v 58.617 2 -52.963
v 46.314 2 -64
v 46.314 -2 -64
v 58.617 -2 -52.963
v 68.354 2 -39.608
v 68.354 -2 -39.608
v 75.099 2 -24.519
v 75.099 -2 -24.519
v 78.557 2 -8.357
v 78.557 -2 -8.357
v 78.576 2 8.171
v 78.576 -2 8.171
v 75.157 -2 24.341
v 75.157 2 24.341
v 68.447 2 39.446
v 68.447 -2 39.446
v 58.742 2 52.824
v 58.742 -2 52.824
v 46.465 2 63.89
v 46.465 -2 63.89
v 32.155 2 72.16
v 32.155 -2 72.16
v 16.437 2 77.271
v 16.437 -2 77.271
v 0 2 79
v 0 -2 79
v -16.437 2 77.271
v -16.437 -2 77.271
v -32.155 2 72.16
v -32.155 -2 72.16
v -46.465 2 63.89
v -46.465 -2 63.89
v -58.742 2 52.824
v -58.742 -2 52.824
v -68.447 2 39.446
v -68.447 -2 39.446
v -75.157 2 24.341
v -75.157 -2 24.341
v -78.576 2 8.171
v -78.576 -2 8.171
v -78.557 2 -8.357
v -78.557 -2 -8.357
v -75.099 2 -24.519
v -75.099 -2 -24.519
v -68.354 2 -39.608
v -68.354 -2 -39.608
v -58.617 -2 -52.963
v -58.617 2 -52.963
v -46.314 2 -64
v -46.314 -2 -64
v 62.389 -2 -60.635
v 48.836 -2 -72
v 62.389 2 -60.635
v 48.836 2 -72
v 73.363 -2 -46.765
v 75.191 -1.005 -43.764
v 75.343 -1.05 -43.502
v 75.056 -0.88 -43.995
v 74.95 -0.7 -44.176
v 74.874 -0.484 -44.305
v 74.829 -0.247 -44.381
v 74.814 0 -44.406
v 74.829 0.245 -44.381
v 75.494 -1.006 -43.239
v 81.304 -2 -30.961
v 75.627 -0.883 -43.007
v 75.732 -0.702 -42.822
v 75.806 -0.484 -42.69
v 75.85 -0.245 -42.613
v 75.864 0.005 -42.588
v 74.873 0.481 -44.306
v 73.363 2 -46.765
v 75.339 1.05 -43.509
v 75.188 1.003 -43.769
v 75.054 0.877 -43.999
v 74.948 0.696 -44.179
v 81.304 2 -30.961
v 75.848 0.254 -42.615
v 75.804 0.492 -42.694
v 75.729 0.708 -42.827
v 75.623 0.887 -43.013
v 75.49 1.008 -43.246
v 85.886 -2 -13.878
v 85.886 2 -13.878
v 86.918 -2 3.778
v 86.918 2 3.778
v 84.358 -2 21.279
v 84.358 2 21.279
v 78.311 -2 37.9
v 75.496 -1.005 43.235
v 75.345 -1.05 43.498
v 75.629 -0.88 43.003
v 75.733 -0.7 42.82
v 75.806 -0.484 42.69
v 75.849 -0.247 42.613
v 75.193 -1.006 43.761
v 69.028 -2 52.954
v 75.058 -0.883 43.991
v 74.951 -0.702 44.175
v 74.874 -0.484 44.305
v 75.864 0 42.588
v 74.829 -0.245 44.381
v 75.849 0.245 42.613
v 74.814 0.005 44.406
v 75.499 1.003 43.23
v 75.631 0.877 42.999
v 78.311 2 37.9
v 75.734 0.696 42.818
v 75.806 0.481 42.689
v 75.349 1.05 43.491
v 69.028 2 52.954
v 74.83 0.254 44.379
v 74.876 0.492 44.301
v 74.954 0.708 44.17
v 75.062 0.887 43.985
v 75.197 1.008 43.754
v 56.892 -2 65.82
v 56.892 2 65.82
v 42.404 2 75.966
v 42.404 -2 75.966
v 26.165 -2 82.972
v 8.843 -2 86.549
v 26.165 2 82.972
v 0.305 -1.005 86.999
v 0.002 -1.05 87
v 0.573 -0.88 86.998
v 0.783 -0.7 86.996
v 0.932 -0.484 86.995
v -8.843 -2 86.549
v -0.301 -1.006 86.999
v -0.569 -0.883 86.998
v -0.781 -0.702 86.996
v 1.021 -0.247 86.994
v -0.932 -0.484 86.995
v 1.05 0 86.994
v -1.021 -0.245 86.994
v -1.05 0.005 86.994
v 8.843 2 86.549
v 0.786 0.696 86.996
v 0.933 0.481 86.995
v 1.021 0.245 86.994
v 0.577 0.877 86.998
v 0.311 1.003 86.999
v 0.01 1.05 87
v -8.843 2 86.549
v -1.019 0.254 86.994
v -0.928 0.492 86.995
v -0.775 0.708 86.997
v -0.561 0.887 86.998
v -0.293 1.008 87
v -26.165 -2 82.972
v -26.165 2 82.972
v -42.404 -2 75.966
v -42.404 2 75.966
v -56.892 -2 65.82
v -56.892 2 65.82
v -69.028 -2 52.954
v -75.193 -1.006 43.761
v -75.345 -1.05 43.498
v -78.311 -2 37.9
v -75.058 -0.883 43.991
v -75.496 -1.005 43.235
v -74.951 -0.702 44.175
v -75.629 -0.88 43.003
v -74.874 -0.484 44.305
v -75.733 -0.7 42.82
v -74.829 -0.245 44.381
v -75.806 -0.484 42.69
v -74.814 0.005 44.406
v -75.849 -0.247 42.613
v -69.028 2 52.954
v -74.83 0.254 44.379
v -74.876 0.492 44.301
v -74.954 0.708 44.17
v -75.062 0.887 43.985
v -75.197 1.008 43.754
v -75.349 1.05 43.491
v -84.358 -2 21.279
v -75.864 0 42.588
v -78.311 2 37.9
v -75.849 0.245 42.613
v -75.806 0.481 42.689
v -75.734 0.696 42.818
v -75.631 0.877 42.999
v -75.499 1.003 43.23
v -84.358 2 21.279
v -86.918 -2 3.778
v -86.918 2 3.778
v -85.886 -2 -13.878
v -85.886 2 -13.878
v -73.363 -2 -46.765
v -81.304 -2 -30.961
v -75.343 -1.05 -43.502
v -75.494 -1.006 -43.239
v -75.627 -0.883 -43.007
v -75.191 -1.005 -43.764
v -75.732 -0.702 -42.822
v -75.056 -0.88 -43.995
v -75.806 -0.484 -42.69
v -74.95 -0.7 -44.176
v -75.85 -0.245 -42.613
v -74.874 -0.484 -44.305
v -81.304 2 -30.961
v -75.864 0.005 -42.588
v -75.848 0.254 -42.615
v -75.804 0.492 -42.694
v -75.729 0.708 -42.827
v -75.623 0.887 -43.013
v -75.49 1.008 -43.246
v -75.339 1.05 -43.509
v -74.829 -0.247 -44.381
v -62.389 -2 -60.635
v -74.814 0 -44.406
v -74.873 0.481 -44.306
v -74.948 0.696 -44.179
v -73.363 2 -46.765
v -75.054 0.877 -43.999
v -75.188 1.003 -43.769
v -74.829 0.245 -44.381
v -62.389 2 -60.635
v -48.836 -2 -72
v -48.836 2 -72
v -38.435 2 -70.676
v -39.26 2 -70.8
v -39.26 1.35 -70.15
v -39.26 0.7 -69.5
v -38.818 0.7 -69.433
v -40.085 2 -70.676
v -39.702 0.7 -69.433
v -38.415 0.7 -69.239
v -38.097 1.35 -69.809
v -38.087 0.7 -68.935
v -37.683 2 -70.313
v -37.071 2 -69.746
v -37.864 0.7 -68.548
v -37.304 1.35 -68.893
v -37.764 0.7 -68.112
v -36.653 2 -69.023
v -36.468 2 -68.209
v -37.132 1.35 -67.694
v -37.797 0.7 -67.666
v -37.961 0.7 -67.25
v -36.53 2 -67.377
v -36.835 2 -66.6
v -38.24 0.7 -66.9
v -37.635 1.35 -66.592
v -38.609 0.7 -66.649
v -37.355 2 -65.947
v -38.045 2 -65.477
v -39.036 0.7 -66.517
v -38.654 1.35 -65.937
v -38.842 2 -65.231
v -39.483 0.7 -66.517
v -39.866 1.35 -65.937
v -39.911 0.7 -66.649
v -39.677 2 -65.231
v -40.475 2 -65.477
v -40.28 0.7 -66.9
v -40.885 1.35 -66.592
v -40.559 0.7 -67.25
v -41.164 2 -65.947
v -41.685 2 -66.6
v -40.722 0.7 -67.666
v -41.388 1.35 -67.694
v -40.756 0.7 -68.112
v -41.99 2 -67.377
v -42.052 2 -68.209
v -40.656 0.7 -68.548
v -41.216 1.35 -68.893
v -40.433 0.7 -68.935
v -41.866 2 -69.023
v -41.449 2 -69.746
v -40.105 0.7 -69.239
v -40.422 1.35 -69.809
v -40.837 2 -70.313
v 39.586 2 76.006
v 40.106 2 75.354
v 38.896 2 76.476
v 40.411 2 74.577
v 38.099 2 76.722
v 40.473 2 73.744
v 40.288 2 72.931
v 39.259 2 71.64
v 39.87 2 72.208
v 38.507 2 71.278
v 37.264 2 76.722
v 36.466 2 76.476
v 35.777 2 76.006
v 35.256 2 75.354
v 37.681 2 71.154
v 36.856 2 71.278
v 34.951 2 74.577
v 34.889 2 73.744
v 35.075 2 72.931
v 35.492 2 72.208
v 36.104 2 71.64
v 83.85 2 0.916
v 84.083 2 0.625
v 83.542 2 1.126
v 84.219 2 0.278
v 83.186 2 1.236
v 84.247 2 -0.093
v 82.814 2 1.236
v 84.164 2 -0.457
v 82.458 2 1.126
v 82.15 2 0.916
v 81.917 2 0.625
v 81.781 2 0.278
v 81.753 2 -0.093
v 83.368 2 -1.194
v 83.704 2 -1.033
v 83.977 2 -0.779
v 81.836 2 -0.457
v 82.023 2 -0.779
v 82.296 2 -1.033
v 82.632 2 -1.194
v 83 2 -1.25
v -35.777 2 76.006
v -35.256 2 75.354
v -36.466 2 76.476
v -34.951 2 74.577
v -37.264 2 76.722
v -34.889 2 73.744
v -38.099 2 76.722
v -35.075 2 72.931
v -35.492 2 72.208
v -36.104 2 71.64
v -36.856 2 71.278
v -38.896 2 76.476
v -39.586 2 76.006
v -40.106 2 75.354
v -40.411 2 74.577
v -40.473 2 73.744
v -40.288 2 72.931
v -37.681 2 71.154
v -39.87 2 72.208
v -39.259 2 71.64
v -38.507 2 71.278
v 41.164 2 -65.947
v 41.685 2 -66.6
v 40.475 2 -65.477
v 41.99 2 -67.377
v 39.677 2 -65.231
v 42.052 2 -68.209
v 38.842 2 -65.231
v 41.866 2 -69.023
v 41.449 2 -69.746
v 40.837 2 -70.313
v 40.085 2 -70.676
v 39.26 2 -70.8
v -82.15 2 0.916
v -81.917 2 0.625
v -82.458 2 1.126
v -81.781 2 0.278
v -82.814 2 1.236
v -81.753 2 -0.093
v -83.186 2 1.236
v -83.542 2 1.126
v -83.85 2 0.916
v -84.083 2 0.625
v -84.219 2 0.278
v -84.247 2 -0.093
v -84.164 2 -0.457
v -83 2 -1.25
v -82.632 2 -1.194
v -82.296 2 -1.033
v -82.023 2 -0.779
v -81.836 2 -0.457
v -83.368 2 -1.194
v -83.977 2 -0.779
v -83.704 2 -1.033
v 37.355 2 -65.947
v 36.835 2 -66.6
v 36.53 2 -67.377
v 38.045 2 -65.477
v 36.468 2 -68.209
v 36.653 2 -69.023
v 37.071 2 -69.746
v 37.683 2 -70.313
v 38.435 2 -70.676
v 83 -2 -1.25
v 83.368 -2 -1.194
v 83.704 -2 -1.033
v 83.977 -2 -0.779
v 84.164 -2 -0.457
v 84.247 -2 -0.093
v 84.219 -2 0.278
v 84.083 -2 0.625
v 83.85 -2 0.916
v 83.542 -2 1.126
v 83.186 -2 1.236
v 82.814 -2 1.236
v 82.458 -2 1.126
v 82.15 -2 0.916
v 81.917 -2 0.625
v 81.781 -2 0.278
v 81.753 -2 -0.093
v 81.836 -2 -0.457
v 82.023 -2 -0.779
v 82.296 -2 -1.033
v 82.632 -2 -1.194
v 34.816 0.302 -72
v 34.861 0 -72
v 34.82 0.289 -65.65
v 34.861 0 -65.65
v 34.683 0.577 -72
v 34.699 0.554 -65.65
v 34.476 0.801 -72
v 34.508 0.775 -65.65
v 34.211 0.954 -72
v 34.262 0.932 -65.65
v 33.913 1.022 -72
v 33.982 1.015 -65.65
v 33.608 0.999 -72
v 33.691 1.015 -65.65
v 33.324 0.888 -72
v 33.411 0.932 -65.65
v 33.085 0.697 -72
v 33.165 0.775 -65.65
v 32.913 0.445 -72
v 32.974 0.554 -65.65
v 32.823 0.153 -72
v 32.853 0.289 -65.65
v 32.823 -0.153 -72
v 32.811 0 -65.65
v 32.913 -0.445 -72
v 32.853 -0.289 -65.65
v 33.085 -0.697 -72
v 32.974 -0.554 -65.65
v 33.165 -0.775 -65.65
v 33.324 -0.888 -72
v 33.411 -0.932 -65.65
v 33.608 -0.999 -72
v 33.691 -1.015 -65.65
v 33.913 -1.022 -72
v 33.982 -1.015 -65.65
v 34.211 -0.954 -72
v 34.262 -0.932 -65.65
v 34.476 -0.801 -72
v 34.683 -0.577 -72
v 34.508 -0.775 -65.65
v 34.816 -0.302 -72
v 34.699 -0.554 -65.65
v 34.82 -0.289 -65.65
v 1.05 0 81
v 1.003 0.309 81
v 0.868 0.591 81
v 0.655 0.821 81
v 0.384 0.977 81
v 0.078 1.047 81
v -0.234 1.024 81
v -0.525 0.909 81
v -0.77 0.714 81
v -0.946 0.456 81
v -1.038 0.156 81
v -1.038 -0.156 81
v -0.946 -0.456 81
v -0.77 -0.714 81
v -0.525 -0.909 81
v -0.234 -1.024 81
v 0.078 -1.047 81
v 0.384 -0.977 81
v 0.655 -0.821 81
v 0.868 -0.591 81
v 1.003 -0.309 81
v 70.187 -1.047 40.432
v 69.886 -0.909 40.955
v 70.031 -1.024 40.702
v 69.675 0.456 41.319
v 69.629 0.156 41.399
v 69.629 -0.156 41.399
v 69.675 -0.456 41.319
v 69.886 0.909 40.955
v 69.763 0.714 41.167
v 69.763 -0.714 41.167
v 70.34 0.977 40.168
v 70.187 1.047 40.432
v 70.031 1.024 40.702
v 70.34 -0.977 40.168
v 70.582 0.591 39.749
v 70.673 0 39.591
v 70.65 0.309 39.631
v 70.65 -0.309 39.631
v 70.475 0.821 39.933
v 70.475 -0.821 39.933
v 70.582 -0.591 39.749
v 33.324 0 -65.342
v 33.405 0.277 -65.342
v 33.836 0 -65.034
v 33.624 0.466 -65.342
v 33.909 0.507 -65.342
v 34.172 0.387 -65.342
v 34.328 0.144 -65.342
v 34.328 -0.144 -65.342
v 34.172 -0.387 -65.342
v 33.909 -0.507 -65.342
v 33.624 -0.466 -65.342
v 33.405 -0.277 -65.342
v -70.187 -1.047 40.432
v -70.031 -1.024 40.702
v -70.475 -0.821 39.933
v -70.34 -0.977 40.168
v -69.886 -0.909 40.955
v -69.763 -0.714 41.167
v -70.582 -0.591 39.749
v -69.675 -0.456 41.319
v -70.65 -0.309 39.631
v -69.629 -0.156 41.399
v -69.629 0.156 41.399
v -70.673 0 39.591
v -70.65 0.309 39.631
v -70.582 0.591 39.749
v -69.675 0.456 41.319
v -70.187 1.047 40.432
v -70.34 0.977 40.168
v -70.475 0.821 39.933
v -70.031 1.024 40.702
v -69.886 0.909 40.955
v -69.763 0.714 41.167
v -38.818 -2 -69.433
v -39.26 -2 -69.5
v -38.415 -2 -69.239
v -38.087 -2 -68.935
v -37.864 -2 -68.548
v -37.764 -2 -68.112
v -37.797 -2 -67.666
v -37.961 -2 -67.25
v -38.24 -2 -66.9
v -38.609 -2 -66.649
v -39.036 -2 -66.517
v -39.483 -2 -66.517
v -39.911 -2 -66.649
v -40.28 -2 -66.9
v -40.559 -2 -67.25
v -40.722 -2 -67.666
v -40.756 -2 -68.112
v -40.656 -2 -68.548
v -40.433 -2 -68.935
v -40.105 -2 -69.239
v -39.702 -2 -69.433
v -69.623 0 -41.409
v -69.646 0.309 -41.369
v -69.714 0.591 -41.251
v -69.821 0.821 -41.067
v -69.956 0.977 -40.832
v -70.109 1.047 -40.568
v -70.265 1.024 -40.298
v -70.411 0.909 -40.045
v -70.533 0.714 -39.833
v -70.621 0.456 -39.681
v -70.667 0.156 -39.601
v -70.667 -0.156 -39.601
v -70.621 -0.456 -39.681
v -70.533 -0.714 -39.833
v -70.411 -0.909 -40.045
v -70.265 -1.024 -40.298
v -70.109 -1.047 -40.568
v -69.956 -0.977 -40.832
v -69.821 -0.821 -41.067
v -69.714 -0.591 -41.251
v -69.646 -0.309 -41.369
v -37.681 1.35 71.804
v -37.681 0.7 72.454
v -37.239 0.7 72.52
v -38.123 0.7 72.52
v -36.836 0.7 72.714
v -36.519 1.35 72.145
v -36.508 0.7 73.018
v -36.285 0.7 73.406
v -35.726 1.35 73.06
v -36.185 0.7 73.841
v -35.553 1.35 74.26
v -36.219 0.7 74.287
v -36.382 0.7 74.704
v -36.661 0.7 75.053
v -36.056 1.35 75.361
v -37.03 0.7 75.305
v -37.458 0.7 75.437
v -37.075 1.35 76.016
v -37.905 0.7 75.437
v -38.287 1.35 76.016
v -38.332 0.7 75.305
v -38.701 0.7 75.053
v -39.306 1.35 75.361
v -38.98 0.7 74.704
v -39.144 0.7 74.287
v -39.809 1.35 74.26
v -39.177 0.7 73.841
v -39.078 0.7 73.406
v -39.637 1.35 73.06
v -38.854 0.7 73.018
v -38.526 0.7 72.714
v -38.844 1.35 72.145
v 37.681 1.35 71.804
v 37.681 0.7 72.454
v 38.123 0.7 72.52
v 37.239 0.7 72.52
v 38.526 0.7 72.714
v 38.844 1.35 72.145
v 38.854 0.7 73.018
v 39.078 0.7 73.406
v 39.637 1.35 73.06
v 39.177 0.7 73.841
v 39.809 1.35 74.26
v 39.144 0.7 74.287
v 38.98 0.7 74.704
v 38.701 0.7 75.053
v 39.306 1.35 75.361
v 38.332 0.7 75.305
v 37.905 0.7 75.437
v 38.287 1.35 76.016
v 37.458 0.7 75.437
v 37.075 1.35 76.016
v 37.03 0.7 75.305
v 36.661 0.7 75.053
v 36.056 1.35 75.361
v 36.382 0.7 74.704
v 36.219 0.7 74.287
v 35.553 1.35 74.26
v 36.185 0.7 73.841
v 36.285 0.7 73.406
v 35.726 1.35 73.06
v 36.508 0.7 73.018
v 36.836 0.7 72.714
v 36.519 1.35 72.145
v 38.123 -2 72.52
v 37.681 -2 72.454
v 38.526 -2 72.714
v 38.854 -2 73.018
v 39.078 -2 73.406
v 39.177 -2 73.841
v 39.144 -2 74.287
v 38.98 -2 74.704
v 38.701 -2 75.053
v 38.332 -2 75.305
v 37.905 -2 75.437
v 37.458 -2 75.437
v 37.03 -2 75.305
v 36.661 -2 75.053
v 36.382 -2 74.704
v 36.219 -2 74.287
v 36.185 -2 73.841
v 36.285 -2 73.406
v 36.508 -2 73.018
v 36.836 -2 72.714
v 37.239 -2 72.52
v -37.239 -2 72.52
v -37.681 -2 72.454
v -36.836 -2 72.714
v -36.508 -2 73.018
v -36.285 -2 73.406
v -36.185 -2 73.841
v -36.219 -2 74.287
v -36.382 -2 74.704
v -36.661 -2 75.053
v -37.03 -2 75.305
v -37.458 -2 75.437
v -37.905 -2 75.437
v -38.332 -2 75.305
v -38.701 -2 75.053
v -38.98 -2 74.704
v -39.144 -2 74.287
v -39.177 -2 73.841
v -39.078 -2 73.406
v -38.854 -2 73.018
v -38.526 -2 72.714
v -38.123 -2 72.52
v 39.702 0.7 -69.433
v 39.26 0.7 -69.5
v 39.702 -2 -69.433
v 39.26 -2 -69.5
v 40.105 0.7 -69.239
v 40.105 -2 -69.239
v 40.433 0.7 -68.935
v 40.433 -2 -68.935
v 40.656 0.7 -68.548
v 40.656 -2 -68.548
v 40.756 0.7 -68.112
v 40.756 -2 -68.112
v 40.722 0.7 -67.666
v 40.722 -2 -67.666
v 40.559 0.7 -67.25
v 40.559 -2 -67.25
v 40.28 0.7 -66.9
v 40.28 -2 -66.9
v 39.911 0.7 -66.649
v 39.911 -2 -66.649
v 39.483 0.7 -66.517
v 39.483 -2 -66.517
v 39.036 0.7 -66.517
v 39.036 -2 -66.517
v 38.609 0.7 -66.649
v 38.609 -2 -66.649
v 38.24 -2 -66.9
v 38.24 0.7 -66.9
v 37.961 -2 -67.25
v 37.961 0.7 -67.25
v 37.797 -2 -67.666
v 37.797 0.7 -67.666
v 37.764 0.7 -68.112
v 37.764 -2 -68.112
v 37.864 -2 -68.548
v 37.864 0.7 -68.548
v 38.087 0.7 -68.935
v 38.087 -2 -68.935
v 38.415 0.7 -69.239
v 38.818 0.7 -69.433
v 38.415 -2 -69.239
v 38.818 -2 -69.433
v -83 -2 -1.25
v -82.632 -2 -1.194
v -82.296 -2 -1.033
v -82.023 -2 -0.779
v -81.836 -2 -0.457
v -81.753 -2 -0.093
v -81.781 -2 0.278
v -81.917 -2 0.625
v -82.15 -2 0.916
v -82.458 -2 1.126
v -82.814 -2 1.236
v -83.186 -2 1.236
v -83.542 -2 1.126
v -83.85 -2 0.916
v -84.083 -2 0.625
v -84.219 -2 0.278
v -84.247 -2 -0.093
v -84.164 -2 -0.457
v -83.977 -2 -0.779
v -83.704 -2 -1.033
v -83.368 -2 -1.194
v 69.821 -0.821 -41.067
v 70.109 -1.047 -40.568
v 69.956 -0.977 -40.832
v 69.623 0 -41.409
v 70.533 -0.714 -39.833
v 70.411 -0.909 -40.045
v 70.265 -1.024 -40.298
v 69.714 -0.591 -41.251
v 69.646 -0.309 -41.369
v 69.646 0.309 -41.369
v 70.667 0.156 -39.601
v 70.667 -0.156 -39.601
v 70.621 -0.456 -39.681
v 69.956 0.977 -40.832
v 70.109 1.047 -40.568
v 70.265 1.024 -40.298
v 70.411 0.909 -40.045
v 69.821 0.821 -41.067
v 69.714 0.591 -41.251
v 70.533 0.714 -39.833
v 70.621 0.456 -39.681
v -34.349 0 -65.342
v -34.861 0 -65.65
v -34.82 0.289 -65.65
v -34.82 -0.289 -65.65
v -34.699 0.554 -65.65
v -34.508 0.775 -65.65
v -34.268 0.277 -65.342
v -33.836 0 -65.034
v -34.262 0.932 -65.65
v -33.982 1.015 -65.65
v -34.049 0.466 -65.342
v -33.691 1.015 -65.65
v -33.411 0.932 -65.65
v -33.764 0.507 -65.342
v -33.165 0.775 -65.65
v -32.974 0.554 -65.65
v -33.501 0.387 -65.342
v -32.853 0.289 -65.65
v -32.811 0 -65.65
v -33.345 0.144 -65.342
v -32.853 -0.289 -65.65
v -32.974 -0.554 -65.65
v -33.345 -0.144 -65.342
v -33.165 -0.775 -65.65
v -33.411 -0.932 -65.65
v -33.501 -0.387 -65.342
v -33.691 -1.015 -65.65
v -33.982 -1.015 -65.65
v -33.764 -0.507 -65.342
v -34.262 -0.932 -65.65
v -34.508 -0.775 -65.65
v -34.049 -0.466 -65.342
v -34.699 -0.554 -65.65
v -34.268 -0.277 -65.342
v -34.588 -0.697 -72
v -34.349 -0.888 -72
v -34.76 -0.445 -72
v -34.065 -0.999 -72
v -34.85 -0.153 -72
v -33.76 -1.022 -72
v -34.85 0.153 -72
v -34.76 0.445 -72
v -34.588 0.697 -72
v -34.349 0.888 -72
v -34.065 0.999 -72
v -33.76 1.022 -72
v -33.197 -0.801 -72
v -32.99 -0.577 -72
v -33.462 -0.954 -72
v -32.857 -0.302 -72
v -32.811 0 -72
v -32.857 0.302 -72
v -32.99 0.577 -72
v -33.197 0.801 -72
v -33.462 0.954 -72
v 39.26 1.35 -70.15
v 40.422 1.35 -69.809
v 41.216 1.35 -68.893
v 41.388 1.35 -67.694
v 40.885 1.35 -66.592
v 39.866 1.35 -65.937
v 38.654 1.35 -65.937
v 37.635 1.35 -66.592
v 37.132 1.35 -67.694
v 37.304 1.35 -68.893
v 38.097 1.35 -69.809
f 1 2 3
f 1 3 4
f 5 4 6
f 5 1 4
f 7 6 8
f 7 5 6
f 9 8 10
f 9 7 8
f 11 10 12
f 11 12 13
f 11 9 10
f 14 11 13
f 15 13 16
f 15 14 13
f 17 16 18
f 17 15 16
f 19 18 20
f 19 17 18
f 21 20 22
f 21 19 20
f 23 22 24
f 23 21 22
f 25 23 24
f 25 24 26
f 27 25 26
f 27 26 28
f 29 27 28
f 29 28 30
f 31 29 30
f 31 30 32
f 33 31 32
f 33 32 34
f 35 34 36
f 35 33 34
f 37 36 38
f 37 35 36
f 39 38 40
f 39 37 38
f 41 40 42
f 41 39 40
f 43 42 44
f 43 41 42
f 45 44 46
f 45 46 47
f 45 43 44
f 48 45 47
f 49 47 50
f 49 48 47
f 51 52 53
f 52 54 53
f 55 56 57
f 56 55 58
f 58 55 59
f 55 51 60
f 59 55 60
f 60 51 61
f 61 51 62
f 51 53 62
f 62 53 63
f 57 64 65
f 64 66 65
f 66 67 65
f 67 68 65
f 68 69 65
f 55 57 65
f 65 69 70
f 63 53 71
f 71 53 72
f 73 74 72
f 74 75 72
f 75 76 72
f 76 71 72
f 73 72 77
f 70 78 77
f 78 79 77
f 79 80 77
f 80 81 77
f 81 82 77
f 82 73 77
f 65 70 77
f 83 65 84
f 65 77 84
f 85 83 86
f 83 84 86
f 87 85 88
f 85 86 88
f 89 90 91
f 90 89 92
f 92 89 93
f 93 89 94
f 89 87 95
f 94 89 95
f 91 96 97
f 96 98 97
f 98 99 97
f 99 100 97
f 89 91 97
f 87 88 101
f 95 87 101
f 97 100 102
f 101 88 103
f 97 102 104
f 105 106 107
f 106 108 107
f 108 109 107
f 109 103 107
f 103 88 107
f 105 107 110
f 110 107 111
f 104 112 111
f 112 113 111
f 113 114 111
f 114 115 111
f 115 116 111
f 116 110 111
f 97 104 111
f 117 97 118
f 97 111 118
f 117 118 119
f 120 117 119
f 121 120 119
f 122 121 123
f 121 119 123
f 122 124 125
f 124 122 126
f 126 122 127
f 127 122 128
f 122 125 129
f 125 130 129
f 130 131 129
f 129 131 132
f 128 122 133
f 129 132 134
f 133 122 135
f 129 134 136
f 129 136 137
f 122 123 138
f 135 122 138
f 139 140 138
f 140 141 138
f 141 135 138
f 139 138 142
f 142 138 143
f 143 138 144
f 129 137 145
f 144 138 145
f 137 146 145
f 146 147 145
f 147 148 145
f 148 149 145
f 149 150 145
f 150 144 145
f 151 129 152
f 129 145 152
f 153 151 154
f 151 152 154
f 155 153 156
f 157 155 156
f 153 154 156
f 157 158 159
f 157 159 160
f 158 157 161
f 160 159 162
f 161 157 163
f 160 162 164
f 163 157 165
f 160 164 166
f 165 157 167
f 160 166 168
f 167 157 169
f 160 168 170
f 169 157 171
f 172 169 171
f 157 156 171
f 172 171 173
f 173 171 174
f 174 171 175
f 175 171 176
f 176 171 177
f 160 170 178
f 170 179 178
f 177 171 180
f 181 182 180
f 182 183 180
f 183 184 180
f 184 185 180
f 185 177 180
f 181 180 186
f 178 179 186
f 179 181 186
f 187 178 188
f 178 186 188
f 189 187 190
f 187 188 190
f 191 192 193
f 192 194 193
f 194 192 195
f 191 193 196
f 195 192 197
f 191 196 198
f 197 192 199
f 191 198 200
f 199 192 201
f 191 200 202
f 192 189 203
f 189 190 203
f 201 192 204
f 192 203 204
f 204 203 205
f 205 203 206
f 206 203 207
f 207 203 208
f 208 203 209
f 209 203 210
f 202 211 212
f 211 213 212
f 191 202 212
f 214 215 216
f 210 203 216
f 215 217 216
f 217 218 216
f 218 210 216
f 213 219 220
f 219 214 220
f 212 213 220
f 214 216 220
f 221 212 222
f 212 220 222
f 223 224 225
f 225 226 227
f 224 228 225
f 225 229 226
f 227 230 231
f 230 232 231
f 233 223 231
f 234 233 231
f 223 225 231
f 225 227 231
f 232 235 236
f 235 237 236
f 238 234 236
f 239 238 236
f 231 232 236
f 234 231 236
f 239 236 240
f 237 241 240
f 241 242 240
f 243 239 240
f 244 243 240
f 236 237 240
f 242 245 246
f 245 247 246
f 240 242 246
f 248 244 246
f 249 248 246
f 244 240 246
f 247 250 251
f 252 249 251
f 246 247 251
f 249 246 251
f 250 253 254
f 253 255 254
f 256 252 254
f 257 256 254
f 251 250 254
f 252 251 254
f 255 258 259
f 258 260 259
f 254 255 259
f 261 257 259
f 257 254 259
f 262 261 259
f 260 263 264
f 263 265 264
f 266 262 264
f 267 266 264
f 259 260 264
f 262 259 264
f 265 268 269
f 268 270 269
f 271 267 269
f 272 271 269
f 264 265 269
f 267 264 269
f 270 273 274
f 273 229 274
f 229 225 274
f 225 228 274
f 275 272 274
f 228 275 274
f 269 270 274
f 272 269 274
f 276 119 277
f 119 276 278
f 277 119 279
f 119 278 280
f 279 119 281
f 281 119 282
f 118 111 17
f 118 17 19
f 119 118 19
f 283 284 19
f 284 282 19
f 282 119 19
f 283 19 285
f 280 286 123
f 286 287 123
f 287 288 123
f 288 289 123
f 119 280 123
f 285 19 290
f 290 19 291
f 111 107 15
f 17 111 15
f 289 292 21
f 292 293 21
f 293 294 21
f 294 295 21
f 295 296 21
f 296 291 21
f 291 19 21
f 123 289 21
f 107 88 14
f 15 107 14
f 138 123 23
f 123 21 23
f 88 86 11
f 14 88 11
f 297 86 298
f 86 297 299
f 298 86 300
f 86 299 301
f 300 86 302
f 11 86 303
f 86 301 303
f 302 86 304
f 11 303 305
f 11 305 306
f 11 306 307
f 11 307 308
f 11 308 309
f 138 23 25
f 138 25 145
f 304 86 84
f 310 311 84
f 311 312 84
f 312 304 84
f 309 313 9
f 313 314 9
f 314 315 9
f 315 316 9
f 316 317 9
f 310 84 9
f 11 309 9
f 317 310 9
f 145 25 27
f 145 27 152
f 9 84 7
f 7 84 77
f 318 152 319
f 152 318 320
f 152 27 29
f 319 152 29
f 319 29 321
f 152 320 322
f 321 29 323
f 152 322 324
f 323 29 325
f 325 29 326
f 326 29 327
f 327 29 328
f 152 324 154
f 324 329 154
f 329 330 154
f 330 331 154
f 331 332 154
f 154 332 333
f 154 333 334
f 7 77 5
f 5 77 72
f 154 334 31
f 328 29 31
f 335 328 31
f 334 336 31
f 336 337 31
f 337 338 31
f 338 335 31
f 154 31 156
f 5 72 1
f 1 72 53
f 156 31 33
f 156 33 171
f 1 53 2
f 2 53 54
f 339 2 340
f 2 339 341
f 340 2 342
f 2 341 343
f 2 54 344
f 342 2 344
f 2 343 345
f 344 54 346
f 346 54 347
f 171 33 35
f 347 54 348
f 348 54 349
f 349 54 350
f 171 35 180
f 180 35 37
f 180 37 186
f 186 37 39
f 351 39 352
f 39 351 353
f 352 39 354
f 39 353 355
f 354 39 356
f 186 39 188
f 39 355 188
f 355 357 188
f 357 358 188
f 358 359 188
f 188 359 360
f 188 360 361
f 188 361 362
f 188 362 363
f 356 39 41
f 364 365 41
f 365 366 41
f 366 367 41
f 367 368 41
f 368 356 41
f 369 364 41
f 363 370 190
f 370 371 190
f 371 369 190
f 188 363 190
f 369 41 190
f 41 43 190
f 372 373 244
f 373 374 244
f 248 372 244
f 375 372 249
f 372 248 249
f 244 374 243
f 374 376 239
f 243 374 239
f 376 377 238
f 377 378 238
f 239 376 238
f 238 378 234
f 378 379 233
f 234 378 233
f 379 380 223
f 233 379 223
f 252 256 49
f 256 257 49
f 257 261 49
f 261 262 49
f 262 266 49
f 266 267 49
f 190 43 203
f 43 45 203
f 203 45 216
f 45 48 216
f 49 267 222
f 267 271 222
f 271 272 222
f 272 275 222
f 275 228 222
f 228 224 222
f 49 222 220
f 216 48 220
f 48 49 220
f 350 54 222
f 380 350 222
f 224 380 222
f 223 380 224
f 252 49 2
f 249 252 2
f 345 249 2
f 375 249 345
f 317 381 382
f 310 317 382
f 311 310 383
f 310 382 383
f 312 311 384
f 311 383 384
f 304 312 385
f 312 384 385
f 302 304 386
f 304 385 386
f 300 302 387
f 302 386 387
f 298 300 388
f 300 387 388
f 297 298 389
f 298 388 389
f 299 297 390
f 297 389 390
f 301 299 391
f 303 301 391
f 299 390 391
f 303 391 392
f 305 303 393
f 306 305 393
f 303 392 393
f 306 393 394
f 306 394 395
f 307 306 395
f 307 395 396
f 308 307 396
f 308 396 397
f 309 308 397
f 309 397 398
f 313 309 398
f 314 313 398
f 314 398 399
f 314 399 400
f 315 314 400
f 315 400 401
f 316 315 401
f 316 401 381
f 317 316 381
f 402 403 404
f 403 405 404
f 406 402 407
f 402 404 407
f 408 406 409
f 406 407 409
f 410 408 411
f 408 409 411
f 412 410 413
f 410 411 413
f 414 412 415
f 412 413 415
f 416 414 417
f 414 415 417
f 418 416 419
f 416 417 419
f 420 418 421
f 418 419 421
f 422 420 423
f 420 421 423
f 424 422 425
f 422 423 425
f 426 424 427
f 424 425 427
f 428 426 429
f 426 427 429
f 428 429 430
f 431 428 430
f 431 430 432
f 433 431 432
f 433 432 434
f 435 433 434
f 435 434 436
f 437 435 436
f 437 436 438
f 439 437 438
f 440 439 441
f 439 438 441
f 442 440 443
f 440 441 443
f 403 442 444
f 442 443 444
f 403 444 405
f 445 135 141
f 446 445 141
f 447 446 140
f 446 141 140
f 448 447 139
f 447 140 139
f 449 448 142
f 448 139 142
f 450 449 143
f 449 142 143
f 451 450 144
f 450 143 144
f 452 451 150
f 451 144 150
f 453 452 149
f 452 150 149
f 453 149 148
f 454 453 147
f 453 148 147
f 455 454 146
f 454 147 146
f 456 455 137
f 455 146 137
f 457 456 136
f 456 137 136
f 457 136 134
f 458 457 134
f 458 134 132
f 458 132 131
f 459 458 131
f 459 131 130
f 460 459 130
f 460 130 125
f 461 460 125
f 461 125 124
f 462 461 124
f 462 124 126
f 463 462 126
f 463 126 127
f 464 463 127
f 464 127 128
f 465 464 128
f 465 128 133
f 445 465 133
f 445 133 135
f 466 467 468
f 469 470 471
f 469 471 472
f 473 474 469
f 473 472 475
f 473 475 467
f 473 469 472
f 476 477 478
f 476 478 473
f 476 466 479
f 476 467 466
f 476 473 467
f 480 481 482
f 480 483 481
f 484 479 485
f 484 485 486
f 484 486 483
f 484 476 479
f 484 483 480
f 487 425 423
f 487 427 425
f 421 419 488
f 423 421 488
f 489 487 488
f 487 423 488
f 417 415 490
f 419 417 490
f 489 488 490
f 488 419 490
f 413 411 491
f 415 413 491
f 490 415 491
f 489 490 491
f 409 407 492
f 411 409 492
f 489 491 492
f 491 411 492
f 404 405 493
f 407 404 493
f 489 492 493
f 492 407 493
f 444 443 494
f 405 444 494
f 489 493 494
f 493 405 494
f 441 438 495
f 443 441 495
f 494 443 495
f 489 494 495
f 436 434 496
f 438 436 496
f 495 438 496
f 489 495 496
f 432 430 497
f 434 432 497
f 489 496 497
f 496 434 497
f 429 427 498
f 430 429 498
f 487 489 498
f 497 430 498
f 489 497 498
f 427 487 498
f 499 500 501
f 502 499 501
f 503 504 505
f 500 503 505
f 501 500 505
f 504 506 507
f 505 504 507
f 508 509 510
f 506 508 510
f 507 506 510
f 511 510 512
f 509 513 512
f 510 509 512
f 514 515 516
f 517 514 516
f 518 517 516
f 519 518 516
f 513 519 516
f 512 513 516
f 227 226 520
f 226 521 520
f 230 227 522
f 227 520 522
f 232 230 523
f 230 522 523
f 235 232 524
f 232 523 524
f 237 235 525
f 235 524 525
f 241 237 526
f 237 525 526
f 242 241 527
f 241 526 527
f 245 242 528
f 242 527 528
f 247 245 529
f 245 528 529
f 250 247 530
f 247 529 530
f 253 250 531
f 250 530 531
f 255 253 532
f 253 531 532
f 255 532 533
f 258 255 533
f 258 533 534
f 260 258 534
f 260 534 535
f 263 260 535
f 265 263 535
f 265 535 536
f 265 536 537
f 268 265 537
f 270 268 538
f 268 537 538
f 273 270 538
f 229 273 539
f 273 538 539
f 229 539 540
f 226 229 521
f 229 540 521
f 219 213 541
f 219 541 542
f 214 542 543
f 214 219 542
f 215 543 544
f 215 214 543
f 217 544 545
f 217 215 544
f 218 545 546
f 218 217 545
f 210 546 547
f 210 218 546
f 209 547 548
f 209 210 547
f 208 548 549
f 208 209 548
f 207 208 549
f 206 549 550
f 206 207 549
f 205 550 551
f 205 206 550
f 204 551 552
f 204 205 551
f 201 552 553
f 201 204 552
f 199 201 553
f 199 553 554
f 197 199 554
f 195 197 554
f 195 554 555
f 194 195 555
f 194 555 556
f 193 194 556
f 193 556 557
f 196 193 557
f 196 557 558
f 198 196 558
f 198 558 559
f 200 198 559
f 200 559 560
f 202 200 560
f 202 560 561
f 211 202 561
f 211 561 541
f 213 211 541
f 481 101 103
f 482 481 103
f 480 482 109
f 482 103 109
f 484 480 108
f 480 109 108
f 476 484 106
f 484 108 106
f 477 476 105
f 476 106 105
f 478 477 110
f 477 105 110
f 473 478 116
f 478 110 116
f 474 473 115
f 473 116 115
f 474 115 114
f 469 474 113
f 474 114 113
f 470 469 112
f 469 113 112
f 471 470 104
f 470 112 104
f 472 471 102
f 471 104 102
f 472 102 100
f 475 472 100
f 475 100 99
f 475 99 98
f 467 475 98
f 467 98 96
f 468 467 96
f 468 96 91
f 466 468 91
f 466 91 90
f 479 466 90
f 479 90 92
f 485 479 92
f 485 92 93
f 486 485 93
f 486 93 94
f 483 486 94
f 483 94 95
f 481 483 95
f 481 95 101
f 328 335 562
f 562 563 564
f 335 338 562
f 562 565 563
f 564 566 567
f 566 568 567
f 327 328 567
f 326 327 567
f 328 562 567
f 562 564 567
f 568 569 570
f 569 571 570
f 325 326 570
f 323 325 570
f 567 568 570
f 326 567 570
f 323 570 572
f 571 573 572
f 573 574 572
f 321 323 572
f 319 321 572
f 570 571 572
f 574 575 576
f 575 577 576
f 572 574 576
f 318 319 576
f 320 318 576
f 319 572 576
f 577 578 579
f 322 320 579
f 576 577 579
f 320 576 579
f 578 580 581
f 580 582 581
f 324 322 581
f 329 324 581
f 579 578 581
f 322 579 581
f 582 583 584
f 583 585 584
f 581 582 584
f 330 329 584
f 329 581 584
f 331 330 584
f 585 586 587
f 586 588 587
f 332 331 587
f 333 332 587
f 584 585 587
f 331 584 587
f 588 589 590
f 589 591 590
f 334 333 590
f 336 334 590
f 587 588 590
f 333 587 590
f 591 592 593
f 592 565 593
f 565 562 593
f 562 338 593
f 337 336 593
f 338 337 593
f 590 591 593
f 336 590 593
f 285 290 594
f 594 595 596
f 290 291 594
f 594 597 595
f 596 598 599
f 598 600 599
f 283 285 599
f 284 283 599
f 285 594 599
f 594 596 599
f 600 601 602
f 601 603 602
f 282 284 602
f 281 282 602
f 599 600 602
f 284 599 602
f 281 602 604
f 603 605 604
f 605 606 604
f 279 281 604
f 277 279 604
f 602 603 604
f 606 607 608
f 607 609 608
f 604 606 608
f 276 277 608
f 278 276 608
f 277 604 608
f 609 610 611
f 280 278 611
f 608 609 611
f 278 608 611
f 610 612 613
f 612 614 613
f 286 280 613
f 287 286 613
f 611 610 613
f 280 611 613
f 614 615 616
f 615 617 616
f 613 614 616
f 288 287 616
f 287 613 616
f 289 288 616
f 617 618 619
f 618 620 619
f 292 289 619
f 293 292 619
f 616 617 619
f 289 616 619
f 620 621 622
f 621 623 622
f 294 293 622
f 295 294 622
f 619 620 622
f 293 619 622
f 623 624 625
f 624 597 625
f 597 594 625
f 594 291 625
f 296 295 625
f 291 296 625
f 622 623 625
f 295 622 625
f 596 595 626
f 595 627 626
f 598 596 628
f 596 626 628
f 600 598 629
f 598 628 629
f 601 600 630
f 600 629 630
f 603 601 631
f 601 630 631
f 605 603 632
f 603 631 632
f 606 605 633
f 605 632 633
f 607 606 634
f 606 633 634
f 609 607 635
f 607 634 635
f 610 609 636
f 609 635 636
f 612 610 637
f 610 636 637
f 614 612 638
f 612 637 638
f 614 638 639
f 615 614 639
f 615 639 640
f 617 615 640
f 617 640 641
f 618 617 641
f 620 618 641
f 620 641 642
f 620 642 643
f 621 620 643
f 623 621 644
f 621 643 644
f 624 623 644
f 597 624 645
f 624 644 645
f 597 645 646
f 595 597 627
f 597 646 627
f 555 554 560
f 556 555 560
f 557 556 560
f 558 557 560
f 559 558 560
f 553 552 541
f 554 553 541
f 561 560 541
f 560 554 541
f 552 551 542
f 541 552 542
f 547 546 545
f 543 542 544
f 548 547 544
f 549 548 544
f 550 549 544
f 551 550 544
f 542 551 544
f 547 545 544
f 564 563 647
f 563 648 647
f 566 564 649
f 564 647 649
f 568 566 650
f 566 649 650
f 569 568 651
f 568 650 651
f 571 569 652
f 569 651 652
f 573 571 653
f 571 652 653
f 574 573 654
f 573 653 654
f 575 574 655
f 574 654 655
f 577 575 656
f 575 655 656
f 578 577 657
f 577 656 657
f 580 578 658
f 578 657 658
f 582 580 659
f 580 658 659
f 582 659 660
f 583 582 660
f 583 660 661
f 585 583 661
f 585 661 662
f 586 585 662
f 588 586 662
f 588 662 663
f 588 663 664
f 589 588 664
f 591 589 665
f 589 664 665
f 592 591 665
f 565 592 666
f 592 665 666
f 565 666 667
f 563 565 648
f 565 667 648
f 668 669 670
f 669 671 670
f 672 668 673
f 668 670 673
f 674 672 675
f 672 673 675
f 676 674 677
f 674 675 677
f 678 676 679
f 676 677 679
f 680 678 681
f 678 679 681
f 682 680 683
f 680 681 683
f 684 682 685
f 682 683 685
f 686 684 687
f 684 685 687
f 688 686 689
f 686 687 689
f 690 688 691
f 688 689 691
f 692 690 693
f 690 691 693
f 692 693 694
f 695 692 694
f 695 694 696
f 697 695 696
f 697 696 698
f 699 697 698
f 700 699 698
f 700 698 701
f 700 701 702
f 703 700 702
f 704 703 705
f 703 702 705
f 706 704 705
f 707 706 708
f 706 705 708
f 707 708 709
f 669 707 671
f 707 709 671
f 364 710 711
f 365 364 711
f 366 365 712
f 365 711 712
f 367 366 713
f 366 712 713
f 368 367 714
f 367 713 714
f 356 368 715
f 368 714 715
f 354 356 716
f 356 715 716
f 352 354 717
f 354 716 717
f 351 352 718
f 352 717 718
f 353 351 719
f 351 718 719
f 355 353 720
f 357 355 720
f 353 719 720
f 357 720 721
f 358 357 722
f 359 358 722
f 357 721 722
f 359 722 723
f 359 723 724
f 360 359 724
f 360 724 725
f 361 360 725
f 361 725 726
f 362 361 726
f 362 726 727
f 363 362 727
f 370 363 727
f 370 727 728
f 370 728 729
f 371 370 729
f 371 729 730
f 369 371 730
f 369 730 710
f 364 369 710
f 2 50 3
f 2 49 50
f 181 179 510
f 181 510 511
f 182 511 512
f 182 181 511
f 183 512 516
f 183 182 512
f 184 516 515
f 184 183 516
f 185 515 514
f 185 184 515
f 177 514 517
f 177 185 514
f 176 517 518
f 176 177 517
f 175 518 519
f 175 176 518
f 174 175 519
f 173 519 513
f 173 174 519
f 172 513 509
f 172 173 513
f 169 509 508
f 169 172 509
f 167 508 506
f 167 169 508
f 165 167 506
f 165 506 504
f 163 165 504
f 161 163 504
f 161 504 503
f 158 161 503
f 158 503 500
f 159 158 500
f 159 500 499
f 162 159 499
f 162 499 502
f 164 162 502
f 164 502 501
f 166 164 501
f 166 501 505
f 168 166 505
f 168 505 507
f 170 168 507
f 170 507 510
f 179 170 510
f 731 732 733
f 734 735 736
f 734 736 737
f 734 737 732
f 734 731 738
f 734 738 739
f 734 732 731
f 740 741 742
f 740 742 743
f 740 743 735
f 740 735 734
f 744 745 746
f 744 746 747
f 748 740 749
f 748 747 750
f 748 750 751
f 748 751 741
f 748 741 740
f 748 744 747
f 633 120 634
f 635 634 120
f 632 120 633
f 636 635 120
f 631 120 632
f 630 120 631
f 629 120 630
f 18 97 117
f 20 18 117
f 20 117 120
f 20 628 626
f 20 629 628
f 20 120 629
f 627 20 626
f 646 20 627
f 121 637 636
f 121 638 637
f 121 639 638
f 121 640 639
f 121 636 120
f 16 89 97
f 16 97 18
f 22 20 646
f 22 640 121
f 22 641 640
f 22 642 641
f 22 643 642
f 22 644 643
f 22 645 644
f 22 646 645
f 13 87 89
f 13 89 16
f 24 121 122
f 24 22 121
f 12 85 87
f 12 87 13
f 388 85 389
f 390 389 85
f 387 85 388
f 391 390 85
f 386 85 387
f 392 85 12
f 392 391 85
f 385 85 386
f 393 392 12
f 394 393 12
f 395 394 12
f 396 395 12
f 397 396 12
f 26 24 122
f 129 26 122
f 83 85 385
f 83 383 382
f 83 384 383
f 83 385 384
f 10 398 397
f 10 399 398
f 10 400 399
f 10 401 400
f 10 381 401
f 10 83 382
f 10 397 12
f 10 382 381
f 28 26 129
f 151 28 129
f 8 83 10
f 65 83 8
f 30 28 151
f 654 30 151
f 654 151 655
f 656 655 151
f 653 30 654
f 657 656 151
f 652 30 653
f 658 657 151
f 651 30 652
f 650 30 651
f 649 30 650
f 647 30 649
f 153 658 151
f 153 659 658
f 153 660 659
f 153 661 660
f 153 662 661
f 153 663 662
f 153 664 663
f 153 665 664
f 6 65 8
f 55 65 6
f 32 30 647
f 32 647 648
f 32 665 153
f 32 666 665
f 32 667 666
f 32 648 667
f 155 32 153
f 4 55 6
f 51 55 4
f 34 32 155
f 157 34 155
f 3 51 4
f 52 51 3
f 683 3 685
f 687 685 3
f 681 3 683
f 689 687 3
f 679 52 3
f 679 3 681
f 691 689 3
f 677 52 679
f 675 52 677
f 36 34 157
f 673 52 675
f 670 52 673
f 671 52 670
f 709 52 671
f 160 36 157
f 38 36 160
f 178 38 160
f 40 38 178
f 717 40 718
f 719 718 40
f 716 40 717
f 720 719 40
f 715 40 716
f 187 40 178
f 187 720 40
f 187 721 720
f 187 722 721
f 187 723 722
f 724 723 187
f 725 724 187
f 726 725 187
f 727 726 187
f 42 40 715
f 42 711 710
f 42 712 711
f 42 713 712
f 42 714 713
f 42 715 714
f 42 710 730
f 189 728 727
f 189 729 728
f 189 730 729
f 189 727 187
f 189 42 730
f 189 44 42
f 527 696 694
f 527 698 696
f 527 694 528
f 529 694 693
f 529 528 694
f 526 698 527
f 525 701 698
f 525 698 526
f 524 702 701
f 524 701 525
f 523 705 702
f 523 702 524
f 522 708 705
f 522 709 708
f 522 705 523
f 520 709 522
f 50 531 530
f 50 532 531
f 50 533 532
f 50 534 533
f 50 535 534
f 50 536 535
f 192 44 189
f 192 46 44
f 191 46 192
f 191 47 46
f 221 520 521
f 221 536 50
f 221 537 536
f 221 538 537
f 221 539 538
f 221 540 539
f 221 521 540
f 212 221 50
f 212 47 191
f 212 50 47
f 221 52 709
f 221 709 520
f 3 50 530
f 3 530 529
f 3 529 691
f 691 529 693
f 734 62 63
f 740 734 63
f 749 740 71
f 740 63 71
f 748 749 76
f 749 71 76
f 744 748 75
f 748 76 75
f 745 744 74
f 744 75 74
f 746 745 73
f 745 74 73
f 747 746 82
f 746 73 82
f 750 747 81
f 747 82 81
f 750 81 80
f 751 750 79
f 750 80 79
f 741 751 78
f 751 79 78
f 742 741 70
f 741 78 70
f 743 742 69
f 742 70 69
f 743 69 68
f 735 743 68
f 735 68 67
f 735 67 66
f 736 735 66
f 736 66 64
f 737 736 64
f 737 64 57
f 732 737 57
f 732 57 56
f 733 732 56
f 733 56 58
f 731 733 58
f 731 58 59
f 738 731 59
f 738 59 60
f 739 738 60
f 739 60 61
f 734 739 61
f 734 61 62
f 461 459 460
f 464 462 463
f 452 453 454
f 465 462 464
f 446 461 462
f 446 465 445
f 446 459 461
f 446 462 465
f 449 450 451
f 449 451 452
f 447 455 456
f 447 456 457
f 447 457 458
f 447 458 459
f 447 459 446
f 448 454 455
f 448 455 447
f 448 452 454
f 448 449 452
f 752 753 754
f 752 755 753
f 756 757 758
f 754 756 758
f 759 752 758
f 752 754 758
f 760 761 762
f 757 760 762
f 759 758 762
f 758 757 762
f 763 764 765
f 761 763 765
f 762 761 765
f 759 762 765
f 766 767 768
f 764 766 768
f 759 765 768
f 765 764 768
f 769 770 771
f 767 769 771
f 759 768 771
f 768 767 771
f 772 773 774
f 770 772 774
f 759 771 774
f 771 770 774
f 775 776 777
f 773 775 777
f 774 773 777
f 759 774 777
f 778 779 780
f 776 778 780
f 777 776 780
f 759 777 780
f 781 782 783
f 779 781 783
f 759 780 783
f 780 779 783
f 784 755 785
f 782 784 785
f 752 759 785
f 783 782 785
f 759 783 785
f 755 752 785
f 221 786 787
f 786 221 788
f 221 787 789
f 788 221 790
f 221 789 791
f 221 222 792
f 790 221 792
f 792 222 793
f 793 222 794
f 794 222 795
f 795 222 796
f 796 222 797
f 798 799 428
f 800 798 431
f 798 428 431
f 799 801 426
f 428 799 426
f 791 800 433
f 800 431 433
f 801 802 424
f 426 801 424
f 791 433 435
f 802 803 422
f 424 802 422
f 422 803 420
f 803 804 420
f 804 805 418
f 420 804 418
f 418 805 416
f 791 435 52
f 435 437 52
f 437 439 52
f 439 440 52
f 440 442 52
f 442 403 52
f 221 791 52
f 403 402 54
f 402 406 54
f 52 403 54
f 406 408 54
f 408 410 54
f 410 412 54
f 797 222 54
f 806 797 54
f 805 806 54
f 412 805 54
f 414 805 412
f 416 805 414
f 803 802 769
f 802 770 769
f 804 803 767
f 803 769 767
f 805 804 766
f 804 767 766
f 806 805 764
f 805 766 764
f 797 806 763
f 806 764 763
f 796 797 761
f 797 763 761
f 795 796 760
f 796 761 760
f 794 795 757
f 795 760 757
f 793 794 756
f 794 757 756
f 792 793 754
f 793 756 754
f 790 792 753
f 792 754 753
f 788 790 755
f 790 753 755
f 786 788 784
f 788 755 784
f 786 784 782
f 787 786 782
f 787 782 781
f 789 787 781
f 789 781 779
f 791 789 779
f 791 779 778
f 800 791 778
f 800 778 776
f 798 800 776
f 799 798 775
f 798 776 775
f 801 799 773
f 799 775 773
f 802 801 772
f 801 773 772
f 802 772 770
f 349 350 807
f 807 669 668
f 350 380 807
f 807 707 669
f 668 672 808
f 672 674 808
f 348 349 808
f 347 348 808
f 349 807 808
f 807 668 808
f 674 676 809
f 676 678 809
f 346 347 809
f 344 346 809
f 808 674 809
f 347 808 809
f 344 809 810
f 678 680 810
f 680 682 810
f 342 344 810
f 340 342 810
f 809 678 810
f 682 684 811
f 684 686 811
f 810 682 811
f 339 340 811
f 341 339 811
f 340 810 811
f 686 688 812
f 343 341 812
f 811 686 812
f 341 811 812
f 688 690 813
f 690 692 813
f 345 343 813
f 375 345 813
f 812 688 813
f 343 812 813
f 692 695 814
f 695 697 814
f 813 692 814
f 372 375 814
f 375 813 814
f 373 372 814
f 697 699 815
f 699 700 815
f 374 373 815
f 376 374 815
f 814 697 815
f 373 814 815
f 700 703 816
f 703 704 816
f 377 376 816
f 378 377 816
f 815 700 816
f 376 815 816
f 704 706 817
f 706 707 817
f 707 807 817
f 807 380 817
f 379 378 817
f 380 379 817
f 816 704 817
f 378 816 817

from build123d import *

# Parameters (mm, degrees)
BOSS_EXTRUDE1_DEPTH           = 2
CSK_FOR_M3_SFHCS1_D           = 3
CSK_FOR_M3_SFHCS1_DEPTH       = 9.5
CSK_FOR_M3_SFHCS1_CSINK_D     = 5.6
CSK_FOR_M3_SFHCS1_CSINK_ANGLE = 90
CSK_FOR_M3_SFHCS1_TIP         = 0.901290929
SKETCH6_R                     = 1.05
CUT_EXTRUDE1_DEPTH            = 6
SKETCH7_R                     = 1.05
CUT_EXTRUDE2_DEPTH            = 6
SKETCH8_R                     = 1.05
CUT_EXTRUDE3_DEPTH            = 6
M2_5X0_45_TAPPED_HOLE1_D      = 2.05
M2_5X0_45_TAPPED_HOLE1_DEPTH  = 6.35
M2_5X0_45_TAPPED_HOLE1_TIP    = 0.615882135
TAP_DRILL_FOR_M3X0_5_TAP1_D   = 2.5


with BuildPart() as part:
    # Sketch1 → Boss-Extrude1 (new, symmetric)
    with BuildSketch(Plane(origin=(0, 0, 0), x_dir=(1, 0, 0), z_dir=(0, 1, 0))):
        with BuildLine():
            Line((-48.836461788, 72), (48.836461788, 72))
            ThreePointArc((48.836461788, 72), (0, -87), (-48.836461788, 72))
        make_face()
        with BuildLine():
            Line((-46.314144708, 64), (46.314144708, 64))
            ThreePointArc((46.314144708, 64), (0, -79), (-46.314144708, 64))
        make_face(mode=Mode.SUBTRACT)
    extrude(amount=BOSS_EXTRUDE1_DEPTH, both=True)

    # CSK for M3 SFHCS1
    with Locations(Plane(origin=(-37.681211478, 2, 73.953541508), x_dir=(0, 0, 1), z_dir=(0, 1, 0))):
        with Locations((0, 0), (-141.953541508, -1.578606827), (-141.953541508, 76.941029783), (0, 75.362422956)):
            CounterSinkHole(CSK_FOR_M3_SFHCS1_D / 2, CSK_FOR_M3_SFHCS1_CSINK_D / 2, depth=CSK_FOR_M3_SFHCS1_DEPTH, counter_sink_angle=CSK_FOR_M3_SFHCS1_CSINK_ANGLE)
            with Locations((0, 0, -(CSK_FOR_M3_SFHCS1_DEPTH + CSK_FOR_M3_SFHCS1_TIP / 2))):  # 118° drill point
                Cone(0, CSK_FOR_M3_SFHCS1_D / 2, CSK_FOR_M3_SFHCS1_TIP, mode=Mode.SUBTRACT)

    # Sketch6 → Cut-Extrude1 (cut)
    with BuildSketch(Plane(origin=(75.344210129, 0, -43.5), x_dir=(-0.49999999999999784, 0, -0.86602540378444), z_dir=(0.86602540378444, 0, -0.49999999999999784))):
        Circle(SKETCH6_R)
    cut_extrude1 = extrude(amount=-CUT_EXTRUDE1_DEPTH, mode=Mode.SUBTRACT)

    # Sketch7 → Cut-Extrude2 (cut)
    with BuildSketch(Plane(origin=(75.344210129, 0, 43.5), x_dir=(0.5000000000000047, 0, -0.866025403784436), z_dir=(0.866025403784436, 0, 0.5000000000000047))):
        Circle(SKETCH7_R)
    cut_extrude2 = extrude(amount=-CUT_EXTRUDE2_DEPTH, mode=Mode.SUBTRACT)

    # Mirror1: Cut-Extrude1, Cut-Extrude2 across plane
    add(cut_extrude1.mirror(Plane(origin=(0, 0, 0), x_dir=(0, 0, 1), z_dir=(1, 0, 0))), mode=Mode.SUBTRACT)
    add(cut_extrude2.mirror(Plane(origin=(0, 0, 0), x_dir=(0, 0, 1), z_dir=(1, 0, 0))), mode=Mode.SUBTRACT)

    # Sketch8 → Cut-Extrude3 (cut)
    with BuildSketch(Plane.XY.offset(87)):
        Circle(SKETCH8_R)
    extrude(amount=-CUT_EXTRUDE3_DEPTH, mode=Mode.SUBTRACT)

    # M2.5x0.45 Tapped Hole1
    with Locations(Plane(origin=(33.836461788, 0, -72), x_dir=(-1, 0, 0), z_dir=(0, 0, -1))):
        with Locations((0, 0), (67.672923576, 0)):
            Hole(M2_5X0_45_TAPPED_HOLE1_D / 2, depth=M2_5X0_45_TAPPED_HOLE1_DEPTH)
            with Locations((0, 0, -(M2_5X0_45_TAPPED_HOLE1_DEPTH + M2_5X0_45_TAPPED_HOLE1_TIP / 2))):  # 118° drill point
                Cone(0, M2_5X0_45_TAPPED_HOLE1_D / 2, M2_5X0_45_TAPPED_HOLE1_TIP, mode=Mode.SUBTRACT)

    # Tap Drill for M3x0.5 Tap1 (through all)
    with Locations(Plane(origin=(-83, 2, 0), x_dir=(0, 0, 1), z_dir=(0, 1, 0))):
        with Locations((0, 0), (0, 166)):
            Hole(TAP_DRILL_FOR_M3X0_5_TAP1_D / 2)


solid = part.part
